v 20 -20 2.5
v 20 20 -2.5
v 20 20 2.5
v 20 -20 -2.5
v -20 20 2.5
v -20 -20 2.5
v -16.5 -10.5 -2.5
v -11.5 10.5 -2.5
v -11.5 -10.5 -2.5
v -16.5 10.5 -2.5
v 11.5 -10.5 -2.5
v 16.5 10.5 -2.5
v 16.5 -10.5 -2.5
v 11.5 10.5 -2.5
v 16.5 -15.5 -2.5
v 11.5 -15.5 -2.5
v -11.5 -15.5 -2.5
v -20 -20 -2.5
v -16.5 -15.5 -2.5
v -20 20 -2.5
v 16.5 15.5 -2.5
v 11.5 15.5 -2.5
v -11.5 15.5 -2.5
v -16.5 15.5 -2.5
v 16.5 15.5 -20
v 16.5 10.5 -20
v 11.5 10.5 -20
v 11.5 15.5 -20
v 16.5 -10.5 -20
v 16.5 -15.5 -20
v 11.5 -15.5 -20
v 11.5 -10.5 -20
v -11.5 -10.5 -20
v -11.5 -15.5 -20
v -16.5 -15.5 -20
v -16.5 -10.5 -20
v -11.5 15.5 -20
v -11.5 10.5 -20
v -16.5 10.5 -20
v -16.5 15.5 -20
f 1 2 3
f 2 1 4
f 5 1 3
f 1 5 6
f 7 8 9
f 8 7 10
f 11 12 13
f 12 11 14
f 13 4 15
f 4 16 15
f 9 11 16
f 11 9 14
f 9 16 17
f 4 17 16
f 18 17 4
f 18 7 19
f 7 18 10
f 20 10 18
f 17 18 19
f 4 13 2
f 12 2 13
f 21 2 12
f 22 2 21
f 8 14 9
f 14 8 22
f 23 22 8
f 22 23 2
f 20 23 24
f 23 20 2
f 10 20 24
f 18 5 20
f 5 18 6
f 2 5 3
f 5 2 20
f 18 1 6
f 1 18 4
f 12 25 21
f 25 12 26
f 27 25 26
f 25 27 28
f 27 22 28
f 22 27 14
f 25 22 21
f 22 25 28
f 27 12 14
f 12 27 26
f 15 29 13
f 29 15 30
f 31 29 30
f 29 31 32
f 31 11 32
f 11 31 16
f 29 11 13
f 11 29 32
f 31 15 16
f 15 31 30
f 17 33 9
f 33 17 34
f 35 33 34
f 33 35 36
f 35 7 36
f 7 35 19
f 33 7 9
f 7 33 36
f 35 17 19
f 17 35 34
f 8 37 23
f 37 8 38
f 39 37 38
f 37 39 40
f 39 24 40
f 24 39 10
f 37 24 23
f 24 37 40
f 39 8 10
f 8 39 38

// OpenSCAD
fa = 1;
fs = 0.4;

cube([40, 40, 5], center=true);

translate([14, 13, -10])
  cube([5, 5, 20], center=true);

translate([14, -13, -10])
  cube([5, 5, 20], center=true);

translate([-14, -13, -10])
  cube([5, 5, 20], center=true);

translate([-14, 13, -10])
  cube([5, 5, 20], center=true);
